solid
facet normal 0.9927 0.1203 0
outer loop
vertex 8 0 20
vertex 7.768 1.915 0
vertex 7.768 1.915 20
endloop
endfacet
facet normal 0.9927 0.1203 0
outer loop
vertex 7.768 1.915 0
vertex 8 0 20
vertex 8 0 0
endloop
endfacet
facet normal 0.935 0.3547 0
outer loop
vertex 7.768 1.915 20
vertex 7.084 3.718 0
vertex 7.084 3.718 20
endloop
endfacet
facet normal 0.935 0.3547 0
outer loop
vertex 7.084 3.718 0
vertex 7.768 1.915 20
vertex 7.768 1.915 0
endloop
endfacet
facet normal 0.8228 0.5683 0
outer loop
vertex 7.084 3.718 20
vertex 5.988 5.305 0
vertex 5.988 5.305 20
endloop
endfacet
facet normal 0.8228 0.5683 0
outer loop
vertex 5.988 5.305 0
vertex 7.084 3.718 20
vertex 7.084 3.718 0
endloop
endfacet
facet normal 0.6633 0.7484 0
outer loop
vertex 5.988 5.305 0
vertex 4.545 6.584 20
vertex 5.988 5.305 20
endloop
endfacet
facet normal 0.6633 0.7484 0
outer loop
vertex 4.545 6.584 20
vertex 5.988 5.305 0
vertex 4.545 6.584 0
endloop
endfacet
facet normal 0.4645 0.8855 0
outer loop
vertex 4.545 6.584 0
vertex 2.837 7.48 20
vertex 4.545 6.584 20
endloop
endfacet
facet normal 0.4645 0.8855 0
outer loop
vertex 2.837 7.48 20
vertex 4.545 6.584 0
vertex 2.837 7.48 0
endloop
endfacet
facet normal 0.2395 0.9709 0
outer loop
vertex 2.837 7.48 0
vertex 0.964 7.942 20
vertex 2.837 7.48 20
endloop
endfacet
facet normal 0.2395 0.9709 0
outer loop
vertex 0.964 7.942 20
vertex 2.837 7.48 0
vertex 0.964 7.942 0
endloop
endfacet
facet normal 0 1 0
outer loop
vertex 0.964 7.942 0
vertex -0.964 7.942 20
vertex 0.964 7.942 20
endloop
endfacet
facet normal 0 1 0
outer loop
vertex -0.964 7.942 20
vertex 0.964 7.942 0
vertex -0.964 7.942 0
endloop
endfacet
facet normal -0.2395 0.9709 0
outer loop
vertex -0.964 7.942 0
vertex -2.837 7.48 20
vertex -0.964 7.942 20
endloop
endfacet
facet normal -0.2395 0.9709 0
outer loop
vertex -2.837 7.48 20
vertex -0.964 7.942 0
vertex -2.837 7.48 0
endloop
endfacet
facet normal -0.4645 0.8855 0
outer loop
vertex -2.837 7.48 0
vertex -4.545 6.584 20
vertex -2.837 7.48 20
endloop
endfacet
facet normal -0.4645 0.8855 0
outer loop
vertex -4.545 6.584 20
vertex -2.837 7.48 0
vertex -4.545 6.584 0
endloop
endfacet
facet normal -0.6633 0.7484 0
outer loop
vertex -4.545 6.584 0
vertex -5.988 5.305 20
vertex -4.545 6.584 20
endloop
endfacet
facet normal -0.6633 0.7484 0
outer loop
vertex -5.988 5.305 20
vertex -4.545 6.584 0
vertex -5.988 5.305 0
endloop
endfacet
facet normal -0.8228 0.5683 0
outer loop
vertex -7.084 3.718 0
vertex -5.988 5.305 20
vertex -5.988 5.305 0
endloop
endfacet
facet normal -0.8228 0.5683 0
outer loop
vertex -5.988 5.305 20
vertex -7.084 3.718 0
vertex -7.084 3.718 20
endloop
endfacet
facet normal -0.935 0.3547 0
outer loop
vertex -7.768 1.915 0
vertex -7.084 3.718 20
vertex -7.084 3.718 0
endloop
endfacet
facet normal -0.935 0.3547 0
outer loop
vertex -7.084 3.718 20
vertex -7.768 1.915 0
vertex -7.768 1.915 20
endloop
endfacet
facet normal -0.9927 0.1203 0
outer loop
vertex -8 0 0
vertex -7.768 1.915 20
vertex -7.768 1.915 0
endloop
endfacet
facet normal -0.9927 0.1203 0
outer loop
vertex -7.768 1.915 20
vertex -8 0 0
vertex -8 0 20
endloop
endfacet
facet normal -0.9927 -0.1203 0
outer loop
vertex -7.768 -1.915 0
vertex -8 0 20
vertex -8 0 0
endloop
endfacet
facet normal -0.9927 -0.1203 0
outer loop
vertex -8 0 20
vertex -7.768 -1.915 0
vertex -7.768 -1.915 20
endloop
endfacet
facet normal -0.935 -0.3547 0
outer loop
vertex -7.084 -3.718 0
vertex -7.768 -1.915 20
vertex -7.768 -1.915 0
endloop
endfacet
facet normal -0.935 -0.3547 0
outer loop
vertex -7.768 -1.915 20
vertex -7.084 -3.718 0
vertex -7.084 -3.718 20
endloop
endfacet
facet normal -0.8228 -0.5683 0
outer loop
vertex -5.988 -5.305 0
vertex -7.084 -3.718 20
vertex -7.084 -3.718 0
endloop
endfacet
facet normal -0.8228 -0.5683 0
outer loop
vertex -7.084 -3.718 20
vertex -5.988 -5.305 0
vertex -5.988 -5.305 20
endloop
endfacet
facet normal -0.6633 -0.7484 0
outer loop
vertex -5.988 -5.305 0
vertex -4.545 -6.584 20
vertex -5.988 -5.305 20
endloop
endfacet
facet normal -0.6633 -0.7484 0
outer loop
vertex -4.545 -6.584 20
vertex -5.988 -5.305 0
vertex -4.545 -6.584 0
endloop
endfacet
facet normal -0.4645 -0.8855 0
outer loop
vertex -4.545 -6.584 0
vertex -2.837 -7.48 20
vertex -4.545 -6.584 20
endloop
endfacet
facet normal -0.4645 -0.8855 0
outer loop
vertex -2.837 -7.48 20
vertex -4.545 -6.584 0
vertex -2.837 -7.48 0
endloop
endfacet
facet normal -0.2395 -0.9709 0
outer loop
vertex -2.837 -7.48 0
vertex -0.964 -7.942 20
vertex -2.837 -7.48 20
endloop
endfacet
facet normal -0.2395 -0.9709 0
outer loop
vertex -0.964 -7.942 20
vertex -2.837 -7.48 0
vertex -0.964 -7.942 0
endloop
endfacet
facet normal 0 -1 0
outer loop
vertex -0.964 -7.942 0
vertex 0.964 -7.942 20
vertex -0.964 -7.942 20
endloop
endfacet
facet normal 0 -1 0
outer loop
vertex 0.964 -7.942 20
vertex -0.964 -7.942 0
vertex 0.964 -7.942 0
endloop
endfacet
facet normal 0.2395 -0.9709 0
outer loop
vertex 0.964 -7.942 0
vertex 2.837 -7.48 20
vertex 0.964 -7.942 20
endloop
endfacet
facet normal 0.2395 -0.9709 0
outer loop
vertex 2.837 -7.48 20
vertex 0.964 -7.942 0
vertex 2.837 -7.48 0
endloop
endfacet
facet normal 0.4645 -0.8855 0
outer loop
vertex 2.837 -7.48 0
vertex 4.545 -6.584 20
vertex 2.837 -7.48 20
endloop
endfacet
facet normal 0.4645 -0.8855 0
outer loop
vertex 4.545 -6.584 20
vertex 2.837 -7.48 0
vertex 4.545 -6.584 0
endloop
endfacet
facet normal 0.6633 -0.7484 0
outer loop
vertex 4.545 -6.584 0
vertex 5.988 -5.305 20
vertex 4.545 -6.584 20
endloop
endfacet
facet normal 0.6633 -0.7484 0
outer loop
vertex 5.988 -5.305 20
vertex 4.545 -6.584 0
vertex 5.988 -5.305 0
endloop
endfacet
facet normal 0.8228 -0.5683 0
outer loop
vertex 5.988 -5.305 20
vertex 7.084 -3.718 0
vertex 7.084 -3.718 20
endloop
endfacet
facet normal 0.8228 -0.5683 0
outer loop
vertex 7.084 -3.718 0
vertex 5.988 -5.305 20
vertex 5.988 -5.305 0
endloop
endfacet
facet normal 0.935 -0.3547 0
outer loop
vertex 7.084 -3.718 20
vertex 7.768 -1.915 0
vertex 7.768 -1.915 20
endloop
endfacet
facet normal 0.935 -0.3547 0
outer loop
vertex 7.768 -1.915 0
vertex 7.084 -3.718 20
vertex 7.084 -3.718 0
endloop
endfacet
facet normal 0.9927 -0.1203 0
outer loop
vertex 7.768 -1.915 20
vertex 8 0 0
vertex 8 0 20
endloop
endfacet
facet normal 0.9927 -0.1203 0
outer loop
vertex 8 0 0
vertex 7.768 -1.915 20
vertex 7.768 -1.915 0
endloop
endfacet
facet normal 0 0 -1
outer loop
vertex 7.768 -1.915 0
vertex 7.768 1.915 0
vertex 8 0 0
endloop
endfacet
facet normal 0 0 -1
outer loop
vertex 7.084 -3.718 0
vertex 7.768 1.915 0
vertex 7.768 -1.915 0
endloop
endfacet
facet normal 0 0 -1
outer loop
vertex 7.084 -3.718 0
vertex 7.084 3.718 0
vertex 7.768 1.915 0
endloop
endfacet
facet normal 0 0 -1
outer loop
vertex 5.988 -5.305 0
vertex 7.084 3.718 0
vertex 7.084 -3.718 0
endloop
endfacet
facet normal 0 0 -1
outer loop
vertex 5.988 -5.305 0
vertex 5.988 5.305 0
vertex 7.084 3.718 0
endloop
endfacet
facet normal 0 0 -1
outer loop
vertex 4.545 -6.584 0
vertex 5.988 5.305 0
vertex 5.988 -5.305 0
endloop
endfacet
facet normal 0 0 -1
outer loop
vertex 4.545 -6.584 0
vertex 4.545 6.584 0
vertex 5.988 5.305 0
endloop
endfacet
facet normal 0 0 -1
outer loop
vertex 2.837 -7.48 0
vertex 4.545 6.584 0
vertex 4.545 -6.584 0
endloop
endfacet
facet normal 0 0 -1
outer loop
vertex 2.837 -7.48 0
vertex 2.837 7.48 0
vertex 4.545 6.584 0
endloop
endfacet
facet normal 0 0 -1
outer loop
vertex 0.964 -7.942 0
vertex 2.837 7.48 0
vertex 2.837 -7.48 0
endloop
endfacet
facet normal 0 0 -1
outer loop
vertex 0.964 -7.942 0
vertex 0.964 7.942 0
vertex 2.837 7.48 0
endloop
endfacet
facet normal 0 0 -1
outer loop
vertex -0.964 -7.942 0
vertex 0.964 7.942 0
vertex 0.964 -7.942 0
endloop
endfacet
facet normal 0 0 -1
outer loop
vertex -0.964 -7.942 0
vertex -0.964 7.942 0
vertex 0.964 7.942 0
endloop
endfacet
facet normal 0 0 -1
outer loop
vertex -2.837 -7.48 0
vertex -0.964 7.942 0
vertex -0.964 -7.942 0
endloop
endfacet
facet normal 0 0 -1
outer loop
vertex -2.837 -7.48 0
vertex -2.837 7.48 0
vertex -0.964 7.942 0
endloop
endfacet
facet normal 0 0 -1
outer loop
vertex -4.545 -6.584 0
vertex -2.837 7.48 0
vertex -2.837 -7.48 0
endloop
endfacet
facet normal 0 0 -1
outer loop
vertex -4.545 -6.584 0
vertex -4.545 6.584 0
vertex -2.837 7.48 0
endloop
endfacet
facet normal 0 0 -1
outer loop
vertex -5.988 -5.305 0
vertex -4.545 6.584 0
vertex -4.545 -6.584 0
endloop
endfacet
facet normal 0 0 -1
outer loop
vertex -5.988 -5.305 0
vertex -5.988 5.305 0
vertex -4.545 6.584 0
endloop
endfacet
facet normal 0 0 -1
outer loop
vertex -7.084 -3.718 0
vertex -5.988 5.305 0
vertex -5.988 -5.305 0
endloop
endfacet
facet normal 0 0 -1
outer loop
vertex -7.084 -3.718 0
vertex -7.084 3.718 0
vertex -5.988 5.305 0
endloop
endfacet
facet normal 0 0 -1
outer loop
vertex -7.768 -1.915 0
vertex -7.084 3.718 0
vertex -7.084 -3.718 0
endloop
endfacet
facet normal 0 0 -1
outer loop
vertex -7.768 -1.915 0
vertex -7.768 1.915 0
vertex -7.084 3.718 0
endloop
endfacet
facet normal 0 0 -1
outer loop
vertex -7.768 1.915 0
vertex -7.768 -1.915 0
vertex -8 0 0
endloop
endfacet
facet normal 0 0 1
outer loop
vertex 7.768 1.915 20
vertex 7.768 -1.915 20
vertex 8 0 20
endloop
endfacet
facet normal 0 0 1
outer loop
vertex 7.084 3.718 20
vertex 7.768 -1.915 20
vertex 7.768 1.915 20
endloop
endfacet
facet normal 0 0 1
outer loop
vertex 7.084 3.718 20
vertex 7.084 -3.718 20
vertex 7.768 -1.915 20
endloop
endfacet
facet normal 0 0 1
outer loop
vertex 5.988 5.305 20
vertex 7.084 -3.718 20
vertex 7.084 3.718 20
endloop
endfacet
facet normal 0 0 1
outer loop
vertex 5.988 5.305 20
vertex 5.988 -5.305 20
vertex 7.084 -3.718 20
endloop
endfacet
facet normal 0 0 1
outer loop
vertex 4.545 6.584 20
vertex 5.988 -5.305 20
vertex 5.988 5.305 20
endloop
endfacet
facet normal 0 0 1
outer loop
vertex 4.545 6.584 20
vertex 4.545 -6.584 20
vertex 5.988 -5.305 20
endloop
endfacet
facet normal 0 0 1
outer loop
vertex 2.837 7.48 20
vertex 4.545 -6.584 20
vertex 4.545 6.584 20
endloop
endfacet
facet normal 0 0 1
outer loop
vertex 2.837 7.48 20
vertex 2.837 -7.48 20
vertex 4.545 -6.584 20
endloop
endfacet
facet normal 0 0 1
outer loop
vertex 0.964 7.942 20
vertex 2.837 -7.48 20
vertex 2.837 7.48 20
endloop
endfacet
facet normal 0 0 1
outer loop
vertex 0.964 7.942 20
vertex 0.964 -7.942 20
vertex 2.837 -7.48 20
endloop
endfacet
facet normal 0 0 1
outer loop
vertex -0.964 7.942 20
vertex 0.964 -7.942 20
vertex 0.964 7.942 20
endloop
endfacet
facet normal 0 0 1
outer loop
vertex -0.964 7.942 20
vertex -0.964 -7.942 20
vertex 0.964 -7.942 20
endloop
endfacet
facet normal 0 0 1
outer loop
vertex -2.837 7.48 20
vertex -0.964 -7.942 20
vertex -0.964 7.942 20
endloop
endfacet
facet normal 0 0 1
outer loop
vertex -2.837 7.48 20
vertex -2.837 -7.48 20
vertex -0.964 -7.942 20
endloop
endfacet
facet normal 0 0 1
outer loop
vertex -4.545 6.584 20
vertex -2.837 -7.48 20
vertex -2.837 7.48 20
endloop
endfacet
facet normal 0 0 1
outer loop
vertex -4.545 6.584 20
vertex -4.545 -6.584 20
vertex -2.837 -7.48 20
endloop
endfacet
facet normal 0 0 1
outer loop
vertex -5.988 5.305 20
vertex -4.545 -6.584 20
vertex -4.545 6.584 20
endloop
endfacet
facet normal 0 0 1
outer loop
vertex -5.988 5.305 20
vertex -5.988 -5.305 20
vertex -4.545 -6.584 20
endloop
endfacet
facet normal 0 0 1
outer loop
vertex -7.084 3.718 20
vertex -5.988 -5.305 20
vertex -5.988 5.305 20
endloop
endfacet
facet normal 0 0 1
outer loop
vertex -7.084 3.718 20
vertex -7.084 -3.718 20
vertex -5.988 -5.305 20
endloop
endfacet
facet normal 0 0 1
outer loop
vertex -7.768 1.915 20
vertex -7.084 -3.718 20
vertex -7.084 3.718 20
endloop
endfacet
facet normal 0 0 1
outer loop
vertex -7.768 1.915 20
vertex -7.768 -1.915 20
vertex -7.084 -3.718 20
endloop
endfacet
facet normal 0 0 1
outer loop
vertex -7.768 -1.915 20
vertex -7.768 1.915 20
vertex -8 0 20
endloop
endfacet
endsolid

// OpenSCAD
// Generated by generate_scads.py
cylinder(h=20, r=8, center=false);
